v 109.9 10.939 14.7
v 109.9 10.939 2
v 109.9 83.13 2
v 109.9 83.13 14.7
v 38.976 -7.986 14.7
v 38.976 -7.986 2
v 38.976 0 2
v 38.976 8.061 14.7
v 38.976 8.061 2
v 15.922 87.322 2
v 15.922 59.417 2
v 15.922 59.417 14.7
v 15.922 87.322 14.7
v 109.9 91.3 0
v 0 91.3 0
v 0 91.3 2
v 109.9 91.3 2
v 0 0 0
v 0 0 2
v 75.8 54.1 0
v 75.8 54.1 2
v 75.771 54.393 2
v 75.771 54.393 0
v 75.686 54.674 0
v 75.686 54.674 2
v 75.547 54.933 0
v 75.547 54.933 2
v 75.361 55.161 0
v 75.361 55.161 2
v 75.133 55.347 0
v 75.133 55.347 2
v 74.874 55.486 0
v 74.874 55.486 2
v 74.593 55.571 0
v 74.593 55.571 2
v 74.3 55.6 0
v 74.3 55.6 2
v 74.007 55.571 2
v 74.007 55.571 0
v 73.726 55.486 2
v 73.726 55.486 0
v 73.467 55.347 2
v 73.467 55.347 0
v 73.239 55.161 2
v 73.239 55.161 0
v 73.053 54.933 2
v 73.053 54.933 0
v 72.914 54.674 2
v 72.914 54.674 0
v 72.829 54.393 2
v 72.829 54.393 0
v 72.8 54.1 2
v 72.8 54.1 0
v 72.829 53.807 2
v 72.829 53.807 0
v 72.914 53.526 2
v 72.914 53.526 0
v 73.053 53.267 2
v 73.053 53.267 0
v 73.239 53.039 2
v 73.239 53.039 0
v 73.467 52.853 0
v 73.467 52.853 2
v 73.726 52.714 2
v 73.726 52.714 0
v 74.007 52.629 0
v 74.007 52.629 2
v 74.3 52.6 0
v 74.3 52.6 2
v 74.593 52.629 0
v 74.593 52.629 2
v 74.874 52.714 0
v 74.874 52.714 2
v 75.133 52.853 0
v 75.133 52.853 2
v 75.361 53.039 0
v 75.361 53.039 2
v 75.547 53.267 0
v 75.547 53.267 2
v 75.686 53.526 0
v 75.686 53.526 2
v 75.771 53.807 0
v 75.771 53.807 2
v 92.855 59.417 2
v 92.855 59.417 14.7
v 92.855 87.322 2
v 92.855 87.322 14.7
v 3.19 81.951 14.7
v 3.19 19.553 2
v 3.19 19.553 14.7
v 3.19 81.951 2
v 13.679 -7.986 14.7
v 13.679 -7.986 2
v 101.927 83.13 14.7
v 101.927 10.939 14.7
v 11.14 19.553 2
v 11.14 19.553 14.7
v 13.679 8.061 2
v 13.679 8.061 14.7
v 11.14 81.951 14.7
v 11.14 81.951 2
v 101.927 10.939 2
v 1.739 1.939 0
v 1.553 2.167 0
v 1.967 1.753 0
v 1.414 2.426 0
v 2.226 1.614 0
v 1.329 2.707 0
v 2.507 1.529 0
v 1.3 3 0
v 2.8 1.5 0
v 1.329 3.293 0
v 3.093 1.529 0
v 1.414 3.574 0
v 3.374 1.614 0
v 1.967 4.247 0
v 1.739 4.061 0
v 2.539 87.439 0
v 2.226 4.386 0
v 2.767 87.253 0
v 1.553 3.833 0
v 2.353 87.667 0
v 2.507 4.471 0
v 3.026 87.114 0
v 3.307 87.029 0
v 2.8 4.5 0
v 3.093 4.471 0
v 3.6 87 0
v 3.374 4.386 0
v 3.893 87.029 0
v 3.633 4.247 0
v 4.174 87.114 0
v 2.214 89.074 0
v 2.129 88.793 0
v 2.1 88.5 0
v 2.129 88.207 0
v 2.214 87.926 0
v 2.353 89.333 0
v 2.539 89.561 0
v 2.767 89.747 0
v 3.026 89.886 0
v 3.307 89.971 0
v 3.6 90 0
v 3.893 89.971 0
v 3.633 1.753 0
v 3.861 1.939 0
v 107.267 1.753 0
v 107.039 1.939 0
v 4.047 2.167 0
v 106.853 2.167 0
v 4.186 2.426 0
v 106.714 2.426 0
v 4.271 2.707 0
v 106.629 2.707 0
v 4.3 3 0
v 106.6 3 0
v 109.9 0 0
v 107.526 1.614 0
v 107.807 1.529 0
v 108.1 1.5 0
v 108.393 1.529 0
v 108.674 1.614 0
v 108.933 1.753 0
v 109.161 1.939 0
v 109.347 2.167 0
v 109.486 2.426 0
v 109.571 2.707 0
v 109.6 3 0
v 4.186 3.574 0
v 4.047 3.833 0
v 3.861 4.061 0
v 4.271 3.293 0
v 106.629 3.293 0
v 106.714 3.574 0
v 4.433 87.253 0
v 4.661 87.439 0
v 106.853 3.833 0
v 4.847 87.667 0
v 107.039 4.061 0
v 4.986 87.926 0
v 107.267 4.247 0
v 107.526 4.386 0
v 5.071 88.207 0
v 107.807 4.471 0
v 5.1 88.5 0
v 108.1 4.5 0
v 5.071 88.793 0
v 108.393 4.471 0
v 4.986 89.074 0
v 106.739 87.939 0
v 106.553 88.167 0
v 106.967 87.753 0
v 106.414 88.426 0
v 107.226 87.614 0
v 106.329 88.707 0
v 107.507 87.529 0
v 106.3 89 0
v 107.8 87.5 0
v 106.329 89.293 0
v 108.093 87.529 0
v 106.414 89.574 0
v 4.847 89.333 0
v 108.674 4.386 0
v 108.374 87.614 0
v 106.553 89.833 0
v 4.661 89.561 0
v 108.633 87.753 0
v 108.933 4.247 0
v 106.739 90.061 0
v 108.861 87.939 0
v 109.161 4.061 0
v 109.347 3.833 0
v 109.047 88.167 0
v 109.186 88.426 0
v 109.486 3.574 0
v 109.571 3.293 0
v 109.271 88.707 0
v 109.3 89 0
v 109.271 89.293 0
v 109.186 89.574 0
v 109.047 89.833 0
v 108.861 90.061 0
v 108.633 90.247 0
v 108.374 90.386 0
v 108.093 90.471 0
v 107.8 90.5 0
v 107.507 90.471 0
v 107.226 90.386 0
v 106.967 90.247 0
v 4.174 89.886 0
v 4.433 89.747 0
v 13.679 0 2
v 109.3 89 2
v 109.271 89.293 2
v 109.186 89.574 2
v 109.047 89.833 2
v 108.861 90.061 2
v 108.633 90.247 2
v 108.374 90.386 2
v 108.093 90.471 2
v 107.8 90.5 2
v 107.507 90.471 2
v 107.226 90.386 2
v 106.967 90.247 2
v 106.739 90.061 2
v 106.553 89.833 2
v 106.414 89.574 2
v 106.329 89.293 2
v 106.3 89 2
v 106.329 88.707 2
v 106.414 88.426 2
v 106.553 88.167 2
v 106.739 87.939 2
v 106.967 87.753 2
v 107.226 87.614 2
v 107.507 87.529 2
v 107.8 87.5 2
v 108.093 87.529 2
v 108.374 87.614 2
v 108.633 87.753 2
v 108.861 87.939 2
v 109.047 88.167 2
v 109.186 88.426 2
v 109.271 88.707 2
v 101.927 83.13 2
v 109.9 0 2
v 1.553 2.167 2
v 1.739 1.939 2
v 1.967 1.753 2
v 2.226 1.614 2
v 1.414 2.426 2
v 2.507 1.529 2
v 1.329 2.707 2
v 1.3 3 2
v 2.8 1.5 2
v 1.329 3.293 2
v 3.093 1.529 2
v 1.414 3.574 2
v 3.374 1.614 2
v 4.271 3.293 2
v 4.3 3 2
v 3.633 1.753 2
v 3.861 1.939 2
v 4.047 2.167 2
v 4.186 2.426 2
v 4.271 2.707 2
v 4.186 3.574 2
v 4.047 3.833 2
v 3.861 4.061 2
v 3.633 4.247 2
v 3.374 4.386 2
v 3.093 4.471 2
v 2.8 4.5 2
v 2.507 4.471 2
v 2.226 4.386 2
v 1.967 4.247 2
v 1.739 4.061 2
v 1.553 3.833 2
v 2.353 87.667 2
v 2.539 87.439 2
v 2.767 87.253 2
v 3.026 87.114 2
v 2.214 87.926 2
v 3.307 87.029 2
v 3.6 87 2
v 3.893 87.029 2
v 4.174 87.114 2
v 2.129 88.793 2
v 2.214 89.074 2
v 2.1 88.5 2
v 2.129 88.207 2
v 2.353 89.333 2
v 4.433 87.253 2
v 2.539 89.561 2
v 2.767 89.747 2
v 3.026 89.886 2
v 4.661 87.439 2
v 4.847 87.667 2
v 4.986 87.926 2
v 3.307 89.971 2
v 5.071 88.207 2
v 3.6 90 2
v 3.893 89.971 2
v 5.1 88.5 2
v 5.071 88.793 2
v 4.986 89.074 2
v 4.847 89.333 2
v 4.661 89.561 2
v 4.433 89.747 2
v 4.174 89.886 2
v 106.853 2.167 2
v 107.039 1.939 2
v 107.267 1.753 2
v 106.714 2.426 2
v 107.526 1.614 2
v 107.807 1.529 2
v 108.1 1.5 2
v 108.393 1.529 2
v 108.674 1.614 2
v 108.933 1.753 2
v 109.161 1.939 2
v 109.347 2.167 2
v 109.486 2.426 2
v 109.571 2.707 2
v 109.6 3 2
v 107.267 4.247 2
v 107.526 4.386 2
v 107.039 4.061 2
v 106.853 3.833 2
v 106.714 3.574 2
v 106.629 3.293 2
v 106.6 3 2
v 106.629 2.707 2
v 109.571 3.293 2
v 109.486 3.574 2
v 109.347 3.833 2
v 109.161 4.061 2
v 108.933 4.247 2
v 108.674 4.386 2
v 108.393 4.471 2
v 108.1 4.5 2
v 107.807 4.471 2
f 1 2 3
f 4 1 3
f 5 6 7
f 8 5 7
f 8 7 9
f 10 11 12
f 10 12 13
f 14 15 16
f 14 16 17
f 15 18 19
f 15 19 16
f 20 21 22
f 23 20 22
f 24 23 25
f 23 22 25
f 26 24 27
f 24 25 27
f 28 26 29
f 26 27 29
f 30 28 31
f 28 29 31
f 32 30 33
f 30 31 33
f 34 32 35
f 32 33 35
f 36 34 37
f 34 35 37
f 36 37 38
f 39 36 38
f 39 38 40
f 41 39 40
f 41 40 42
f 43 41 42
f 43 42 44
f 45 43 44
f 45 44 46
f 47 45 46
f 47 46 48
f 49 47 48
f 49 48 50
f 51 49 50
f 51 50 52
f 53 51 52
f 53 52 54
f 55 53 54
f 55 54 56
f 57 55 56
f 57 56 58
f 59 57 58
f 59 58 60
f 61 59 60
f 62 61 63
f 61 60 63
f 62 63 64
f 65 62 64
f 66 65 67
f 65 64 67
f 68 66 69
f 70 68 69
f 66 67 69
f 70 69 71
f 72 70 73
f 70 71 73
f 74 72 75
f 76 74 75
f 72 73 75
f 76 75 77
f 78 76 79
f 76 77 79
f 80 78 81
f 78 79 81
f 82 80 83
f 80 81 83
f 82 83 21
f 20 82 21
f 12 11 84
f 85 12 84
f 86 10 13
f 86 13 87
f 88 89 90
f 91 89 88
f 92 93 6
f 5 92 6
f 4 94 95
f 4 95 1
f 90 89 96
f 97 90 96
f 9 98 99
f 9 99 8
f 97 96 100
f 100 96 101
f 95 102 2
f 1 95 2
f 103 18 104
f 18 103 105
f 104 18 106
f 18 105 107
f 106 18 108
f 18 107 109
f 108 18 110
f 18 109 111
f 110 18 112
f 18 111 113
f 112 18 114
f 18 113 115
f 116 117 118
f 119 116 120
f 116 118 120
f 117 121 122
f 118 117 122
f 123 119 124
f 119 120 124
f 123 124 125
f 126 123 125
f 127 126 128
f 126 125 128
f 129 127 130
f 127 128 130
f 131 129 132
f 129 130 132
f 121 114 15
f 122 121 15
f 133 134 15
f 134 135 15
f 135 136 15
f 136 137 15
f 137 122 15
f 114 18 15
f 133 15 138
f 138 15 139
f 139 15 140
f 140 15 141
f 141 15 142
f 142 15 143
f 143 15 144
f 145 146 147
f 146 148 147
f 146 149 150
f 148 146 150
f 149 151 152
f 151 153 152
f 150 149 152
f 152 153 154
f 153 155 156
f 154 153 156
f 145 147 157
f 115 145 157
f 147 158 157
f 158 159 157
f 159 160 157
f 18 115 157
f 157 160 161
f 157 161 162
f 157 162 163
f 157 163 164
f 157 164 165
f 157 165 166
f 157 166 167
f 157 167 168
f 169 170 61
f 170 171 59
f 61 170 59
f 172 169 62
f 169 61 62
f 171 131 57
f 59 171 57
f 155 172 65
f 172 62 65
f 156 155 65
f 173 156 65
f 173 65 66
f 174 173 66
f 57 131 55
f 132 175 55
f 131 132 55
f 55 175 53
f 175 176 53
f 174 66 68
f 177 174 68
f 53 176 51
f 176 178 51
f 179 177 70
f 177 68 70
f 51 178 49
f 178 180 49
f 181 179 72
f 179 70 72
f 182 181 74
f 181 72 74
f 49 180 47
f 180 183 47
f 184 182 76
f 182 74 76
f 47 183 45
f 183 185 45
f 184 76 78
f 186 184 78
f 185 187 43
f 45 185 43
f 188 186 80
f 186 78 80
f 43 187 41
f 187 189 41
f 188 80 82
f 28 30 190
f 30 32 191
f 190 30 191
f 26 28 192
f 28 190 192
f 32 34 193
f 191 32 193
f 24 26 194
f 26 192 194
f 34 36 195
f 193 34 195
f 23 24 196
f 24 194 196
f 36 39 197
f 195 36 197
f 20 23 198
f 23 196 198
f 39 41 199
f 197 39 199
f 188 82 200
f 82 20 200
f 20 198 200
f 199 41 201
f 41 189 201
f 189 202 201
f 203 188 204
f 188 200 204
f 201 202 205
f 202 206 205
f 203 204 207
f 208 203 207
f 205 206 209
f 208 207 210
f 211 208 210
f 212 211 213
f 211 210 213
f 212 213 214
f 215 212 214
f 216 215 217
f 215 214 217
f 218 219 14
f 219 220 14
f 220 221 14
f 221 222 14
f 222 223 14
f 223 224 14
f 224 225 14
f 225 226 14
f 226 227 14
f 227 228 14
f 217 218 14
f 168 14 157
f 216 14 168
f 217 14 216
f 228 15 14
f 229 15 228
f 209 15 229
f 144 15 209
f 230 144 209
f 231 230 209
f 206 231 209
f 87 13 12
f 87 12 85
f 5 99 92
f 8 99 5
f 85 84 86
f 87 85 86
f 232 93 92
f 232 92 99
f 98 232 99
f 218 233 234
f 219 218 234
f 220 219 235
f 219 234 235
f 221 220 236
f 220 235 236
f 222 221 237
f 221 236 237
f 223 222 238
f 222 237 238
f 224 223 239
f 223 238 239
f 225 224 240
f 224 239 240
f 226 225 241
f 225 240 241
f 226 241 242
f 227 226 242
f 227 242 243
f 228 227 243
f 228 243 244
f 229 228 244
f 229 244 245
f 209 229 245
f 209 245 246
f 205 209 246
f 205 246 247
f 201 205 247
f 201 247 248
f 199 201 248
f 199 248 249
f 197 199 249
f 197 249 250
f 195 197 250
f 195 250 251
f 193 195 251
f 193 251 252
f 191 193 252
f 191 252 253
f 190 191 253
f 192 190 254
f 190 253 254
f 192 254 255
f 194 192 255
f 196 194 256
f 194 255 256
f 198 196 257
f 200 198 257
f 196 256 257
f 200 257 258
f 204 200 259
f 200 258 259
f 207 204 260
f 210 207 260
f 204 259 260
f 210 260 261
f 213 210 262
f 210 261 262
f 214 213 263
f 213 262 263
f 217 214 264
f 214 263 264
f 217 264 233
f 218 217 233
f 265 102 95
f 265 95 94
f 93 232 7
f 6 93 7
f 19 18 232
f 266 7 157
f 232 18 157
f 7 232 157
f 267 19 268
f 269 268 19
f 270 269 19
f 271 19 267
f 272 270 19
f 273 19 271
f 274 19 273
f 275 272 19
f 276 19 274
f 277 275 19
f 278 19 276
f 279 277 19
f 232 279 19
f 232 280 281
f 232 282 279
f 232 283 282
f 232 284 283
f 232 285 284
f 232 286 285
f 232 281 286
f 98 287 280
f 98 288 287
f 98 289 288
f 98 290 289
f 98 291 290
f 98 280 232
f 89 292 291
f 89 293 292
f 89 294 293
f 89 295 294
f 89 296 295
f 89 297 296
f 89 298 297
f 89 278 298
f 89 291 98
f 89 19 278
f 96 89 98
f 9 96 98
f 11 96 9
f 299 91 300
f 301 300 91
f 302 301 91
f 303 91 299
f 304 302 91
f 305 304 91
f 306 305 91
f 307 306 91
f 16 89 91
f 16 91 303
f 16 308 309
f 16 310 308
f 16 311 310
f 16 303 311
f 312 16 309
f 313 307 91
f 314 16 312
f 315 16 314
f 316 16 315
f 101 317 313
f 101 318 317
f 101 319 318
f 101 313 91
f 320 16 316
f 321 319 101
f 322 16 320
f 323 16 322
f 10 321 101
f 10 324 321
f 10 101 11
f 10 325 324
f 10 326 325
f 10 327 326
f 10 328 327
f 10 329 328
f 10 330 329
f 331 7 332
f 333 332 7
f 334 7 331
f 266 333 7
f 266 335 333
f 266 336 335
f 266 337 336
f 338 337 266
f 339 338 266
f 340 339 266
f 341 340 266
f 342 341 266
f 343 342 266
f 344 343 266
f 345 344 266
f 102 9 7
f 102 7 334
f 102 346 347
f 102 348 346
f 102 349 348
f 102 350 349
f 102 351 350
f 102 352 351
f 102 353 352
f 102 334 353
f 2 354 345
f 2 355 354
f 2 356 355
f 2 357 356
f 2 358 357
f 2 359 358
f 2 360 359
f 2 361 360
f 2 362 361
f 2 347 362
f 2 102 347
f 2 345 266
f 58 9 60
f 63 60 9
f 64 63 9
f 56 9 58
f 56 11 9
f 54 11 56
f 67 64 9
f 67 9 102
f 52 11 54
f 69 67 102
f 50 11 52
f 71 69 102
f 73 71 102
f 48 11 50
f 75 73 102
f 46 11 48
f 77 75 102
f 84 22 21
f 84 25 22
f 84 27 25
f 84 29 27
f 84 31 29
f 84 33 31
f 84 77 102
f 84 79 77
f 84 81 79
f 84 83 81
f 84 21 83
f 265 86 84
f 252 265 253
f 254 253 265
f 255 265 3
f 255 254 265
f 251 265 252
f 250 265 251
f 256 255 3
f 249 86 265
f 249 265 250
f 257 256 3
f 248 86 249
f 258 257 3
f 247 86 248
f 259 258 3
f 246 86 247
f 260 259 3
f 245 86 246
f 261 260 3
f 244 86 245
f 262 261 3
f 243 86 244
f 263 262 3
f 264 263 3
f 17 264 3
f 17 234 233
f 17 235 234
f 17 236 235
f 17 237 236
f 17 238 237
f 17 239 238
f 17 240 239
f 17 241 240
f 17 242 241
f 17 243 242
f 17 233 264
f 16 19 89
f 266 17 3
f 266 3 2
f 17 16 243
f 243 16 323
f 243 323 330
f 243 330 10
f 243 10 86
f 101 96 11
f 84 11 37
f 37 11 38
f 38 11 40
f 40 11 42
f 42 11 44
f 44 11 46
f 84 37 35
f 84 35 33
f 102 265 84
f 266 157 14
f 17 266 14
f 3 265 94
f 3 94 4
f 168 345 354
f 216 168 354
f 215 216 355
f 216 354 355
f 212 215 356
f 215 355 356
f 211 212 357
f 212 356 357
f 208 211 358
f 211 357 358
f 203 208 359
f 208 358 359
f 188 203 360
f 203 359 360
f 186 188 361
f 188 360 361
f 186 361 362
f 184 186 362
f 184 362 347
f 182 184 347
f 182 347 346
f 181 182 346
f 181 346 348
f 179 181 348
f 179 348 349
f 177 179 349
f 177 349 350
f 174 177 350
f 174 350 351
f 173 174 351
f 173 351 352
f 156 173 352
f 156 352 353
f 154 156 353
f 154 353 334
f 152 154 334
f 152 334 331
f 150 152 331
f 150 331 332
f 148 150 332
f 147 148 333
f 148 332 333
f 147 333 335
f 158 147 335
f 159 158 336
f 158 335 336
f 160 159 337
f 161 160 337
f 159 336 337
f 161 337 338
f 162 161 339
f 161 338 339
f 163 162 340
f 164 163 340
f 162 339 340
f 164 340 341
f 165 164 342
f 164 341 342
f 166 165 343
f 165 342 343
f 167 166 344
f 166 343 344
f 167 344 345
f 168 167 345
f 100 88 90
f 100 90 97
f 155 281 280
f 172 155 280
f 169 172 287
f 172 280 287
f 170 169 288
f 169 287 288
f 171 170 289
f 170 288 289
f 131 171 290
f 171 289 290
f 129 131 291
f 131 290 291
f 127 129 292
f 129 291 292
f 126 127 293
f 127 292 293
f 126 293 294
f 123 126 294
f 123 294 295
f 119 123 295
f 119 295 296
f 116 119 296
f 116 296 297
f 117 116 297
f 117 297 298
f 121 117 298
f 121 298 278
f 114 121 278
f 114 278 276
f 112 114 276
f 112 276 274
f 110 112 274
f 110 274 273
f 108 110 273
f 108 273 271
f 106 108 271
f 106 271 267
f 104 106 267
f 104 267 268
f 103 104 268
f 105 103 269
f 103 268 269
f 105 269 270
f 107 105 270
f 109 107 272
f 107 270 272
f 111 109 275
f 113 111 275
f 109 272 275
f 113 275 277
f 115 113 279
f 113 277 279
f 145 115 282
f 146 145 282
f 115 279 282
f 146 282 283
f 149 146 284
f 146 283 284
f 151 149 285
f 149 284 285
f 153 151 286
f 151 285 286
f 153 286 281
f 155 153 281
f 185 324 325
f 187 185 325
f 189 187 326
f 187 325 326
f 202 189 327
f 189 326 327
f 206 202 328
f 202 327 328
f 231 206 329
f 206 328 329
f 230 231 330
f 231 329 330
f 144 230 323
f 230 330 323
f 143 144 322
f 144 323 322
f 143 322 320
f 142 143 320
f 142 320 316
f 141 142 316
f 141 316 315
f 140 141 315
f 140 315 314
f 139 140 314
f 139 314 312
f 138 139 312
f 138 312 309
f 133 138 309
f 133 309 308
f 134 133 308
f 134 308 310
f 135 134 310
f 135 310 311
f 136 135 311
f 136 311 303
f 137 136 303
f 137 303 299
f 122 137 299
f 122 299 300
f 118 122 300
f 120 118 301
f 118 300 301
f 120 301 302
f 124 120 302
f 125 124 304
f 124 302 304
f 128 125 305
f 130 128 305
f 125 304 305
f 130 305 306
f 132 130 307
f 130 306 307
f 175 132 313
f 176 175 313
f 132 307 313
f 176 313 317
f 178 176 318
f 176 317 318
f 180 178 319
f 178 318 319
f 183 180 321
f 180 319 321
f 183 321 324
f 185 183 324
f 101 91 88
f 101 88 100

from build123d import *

# Parameters (mm, degrees)
F0_W     = 109.9
F0_H     = 91.3
F1_DEPTH = 2
F2_R     = 1.5
F3_DEPTH = 25.4
F4_W     = 25.296519
F4_H     = 16.046952
F5_DEPTH = 12.7
F6_W     = 7.949238
F6_H     = 62.397955
F7_DEPTH = 12.7
F8_W     = 7.973293
F8_H     = 72.191391
F8_W_2   = 76.933302
F8_H_2   = 27.90428
F9_DEPTH = 12.7


with BuildPart() as f1:
    # F0 (on Top) → F1 (new body)
    with BuildSketch(Plane.XY):
        with Locations((54.95, 45.65)):
            Rectangle(F0_W, F0_H)
    extrude(amount=F1_DEPTH)

    # F2 (on face) → F3 (cut)
    with BuildSketch(Plane.XY.offset(2)):
        with Locations((3.6, 88.5)):
            Circle(F2_R)
        with Locations((108.1, 3)):
            Circle(F2_R)
        with Locations((107.8, 89)):
            Circle(F2_R)
        with Locations((2.8, 3)):
            Circle(F2_R)
        with Locations((74.3, 54.1)):
            Circle(F2_R)
    extrude(amount=-F3_DEPTH, mode=Mode.SUBTRACT)

    # F4 (on face) → F5 (join)
    with BuildSketch(Plane.XY.offset(2)):
        with Locations((26.327649, 0.037087)):
            Rectangle(F4_W, F4_H)
    extrude(amount=F5_DEPTH)

    # F6 (on face) → F7 (join)
    with BuildSketch(Plane.XY.offset(2)):
        with Locations((7.164945, 50.75232)):
            Rectangle(F6_W, F6_H)
    extrude(amount=F7_DEPTH)

    # F8 (on face) → F9 (join)
    with BuildSketch(Plane.XY.offset(2)):
        with Locations((105.913353, 47.034552)):
            Rectangle(F8_W, F8_H)
        with Locations((54.388795, 73.369596)):
            Rectangle(F8_W_2, F8_H_2)
    extrude(amount=F9_DEPTH)


solid = f1.part
